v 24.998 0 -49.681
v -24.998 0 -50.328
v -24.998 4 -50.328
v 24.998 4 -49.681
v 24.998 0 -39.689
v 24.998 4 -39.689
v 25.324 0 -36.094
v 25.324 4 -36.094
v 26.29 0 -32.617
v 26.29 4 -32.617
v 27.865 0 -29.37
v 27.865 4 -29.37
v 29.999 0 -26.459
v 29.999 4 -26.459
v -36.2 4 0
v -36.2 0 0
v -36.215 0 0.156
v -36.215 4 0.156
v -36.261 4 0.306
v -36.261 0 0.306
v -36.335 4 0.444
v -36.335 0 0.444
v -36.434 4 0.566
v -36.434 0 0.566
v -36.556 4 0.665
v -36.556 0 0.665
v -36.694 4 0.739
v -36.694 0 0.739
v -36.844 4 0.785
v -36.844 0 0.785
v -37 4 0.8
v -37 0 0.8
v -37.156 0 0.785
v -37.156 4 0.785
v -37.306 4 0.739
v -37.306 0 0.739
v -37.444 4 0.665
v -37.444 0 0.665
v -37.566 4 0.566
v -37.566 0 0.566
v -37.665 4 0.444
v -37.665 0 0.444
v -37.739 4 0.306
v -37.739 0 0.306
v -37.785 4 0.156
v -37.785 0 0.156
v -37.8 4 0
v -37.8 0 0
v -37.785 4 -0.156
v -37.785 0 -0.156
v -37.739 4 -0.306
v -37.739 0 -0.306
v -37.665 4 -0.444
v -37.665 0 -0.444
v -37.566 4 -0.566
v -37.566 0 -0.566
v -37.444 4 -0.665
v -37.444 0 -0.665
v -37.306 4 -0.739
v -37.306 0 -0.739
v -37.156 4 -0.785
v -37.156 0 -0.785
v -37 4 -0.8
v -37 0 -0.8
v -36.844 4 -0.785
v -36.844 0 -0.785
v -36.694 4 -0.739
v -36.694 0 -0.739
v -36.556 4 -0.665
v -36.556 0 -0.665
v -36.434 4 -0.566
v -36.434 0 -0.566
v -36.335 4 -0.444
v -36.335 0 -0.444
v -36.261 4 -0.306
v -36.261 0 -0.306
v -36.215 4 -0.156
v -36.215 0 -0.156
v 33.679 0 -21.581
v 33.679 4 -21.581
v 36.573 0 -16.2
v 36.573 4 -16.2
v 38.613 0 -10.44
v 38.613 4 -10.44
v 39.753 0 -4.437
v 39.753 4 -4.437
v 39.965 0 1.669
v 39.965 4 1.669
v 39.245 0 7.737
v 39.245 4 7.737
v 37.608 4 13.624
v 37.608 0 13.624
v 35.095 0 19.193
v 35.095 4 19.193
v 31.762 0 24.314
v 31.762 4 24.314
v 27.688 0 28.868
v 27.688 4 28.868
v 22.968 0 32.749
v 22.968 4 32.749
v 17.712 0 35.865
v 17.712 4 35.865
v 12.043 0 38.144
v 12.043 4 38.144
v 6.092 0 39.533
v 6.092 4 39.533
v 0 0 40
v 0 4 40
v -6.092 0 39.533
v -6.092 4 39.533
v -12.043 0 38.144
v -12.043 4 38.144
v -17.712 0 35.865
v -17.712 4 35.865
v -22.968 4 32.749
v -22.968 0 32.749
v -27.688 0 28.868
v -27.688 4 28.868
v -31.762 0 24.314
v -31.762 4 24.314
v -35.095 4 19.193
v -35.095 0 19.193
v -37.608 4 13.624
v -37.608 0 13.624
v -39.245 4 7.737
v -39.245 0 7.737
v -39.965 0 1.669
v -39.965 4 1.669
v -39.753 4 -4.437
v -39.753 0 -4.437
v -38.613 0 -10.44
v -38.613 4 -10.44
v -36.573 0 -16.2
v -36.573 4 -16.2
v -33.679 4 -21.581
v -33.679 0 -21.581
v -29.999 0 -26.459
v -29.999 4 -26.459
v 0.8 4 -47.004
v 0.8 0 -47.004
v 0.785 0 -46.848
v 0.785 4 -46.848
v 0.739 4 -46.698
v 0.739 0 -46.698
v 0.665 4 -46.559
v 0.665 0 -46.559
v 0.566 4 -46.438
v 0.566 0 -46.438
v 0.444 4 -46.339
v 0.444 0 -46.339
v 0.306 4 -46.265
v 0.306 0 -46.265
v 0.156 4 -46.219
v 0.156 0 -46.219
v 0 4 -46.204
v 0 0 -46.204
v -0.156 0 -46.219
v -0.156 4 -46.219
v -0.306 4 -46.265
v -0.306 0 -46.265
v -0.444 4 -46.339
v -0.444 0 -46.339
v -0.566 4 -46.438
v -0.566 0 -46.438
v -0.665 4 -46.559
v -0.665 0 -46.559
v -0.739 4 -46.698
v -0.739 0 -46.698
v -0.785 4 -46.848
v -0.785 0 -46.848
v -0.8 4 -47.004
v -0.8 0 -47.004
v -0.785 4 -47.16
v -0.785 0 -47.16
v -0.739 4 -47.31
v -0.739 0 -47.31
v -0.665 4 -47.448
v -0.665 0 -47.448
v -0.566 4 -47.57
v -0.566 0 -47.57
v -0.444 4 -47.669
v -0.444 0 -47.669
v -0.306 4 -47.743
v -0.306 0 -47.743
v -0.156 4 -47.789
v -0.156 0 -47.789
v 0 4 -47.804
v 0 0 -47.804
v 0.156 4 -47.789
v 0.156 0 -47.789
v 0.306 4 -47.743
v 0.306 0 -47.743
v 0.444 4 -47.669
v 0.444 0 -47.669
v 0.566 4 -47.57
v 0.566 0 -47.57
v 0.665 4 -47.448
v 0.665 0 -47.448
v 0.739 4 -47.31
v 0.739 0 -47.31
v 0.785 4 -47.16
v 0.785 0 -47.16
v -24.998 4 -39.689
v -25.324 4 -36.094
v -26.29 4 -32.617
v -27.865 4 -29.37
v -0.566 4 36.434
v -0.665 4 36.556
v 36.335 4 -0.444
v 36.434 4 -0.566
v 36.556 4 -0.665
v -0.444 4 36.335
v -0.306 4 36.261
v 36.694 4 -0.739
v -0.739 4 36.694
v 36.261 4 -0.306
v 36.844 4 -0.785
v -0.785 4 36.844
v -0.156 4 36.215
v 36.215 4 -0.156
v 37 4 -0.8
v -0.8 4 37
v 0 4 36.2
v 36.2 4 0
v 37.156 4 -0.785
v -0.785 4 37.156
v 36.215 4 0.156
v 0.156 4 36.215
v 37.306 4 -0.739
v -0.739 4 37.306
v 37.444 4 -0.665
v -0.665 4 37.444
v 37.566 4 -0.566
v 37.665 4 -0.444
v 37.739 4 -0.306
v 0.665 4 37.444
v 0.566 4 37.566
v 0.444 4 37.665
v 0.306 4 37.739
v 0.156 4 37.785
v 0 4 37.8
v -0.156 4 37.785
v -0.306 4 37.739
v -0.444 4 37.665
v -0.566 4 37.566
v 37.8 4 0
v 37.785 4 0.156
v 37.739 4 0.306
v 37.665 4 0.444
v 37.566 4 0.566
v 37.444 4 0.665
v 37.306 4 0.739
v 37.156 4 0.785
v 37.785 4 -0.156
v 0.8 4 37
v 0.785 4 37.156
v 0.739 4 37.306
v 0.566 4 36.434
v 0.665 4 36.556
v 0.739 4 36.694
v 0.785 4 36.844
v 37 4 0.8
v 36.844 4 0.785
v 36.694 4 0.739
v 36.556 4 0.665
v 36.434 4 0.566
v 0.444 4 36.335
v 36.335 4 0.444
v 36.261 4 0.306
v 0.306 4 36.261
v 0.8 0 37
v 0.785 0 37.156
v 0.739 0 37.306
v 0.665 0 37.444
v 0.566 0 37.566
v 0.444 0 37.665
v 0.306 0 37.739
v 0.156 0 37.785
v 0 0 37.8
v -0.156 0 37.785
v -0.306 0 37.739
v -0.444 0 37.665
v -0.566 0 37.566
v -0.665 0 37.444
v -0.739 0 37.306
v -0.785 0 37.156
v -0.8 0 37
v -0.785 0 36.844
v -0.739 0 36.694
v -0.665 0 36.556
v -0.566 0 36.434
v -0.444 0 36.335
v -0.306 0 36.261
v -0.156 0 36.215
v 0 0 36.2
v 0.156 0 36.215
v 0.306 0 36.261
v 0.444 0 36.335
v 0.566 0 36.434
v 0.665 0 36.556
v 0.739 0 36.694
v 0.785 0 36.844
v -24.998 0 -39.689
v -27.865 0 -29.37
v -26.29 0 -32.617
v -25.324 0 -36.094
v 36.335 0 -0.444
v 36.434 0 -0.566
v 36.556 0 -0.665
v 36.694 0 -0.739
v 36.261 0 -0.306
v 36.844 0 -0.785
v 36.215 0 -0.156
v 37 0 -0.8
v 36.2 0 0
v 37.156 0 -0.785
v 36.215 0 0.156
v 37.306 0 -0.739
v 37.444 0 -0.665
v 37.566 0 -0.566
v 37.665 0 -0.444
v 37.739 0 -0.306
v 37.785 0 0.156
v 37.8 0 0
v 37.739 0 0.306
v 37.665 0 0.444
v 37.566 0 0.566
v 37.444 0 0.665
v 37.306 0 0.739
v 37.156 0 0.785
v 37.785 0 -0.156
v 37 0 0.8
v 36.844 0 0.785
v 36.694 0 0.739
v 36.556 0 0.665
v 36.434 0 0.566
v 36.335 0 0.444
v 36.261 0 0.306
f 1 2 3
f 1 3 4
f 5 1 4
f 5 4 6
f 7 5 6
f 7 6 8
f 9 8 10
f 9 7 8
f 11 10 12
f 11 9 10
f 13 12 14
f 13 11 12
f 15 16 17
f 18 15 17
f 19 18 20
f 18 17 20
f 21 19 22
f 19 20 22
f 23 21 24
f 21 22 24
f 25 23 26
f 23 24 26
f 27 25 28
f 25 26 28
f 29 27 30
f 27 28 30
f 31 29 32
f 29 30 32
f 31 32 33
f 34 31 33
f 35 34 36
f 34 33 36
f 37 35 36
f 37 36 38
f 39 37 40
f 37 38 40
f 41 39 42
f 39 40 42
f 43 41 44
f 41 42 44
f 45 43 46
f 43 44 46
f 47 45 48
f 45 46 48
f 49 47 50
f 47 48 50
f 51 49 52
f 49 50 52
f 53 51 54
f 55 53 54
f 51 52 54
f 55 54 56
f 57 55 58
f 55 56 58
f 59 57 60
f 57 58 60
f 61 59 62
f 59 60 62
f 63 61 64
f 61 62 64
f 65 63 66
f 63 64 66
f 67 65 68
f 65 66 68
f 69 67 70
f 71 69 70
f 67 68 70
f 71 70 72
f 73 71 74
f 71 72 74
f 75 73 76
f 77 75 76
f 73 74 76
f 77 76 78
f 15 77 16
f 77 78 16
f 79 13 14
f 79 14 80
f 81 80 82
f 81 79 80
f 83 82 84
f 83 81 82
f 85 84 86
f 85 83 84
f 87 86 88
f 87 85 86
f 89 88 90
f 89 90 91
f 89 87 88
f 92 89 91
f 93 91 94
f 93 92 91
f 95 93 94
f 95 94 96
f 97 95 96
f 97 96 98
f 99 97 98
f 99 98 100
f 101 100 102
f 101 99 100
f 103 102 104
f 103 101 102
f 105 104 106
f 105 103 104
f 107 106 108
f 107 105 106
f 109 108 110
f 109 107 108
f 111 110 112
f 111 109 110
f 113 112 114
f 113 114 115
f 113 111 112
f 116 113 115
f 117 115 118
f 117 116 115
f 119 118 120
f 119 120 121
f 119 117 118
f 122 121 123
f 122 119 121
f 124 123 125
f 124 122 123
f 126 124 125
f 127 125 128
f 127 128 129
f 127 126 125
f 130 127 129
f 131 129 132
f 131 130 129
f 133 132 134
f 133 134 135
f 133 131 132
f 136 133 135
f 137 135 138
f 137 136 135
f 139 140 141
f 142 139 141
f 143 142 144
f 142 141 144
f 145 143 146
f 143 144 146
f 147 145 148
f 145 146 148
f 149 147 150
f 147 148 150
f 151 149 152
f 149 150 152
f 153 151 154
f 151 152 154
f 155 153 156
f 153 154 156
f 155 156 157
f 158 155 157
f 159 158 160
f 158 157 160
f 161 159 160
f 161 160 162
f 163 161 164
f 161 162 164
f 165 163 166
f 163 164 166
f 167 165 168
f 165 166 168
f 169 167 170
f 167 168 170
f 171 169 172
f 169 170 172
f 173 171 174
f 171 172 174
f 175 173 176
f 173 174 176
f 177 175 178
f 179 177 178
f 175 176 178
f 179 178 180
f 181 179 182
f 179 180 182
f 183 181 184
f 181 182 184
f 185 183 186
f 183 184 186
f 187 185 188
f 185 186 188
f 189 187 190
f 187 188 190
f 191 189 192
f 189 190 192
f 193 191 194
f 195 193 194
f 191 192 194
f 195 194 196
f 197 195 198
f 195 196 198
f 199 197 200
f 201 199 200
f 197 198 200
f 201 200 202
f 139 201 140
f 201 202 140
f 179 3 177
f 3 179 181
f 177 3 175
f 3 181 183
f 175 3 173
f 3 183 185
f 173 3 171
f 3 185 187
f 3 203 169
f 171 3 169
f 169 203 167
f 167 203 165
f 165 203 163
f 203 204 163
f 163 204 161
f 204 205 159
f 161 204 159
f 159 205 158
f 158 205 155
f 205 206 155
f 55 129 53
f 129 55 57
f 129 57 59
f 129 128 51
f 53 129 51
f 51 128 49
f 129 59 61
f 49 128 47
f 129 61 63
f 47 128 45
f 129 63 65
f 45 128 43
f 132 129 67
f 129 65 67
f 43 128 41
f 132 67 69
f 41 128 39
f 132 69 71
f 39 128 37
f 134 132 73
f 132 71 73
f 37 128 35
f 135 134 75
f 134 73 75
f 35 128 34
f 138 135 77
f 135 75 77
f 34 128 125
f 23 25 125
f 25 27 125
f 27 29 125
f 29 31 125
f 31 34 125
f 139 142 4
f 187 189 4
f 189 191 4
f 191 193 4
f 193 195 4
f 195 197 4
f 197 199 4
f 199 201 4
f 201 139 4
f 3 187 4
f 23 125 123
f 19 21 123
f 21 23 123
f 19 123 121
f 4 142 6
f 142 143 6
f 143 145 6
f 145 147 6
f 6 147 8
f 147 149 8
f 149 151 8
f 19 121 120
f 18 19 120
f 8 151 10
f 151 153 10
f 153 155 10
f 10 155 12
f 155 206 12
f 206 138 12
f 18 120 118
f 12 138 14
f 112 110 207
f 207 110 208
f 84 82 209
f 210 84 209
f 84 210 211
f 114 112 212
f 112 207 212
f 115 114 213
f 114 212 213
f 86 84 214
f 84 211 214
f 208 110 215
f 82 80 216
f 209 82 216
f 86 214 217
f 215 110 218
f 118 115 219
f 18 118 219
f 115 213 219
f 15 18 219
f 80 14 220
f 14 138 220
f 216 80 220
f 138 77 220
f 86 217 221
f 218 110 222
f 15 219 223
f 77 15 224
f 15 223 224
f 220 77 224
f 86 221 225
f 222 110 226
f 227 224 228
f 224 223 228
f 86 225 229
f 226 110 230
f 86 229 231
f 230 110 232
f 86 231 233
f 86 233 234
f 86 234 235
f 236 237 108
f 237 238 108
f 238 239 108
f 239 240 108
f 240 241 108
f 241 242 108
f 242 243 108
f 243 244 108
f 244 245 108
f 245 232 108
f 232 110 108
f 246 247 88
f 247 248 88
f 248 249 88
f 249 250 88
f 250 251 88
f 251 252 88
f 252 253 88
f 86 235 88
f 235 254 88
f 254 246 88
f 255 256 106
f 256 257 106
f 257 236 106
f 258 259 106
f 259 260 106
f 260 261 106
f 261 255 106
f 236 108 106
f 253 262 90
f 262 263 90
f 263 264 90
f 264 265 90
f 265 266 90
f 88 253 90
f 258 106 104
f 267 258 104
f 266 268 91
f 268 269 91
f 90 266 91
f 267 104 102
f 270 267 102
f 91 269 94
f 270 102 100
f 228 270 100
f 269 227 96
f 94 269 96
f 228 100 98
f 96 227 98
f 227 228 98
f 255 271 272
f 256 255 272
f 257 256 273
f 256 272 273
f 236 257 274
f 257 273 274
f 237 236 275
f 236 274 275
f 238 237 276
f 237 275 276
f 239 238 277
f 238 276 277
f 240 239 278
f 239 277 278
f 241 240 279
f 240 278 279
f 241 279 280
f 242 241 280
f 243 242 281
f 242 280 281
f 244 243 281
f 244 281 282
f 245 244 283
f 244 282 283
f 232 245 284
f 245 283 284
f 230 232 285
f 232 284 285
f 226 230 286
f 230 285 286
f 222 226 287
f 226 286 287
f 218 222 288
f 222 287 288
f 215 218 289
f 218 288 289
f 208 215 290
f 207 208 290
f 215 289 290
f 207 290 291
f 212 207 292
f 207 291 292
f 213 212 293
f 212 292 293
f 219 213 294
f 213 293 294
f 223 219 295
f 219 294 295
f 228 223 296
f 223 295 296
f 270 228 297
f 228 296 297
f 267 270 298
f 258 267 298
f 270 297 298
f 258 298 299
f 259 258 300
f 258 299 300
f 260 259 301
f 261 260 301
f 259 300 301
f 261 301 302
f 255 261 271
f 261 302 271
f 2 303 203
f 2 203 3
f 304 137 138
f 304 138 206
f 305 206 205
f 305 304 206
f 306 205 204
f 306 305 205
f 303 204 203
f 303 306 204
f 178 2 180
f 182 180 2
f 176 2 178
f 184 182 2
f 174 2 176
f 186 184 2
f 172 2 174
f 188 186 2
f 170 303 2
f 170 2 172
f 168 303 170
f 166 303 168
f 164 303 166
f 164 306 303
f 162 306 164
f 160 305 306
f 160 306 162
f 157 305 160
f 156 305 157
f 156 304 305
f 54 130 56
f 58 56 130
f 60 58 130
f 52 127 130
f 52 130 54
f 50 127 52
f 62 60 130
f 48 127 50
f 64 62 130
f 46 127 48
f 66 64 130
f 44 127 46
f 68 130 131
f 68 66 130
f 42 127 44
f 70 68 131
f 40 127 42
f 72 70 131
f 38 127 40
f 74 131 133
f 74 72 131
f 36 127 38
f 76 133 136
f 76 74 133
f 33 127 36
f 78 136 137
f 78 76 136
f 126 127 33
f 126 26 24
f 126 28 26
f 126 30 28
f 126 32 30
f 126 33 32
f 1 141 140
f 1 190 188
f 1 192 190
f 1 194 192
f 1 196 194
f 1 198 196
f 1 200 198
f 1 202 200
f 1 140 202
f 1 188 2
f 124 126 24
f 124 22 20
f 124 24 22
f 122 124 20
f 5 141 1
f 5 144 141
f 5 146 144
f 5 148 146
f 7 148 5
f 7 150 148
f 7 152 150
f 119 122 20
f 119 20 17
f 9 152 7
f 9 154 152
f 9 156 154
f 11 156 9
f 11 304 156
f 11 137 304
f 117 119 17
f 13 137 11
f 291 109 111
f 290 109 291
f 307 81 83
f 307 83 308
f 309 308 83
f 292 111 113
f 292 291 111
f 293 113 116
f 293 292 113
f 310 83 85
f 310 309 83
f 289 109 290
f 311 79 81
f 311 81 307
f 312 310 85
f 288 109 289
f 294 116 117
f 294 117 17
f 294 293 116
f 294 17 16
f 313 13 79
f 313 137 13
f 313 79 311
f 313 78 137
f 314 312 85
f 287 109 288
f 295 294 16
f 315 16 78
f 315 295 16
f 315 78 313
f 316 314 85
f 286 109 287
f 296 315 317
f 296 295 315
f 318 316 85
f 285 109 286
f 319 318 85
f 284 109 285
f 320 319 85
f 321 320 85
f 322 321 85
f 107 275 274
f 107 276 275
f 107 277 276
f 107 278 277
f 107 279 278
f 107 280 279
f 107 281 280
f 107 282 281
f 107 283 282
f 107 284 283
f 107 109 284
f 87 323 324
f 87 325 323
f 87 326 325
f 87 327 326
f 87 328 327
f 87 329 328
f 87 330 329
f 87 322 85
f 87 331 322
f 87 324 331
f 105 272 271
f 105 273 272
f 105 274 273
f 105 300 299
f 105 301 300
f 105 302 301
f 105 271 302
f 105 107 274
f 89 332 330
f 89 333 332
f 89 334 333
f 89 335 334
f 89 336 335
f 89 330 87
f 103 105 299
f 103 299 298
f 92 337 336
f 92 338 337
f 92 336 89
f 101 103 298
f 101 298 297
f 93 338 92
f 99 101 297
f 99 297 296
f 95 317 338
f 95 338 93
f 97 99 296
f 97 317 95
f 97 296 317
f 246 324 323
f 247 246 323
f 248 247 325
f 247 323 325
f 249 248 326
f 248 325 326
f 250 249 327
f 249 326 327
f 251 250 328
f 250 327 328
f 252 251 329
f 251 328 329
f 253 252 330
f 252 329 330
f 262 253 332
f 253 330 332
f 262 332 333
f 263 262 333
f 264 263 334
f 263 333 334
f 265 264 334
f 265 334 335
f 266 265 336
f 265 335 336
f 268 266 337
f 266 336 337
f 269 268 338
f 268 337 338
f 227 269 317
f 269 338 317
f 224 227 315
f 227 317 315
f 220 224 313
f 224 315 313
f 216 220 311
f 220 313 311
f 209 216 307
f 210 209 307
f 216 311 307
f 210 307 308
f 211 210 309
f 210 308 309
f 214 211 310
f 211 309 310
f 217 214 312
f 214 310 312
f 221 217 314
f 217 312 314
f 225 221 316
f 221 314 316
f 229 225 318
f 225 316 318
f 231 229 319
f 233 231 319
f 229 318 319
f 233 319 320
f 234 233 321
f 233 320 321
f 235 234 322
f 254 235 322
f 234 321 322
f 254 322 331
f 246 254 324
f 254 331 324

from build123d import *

# Parameters (mm, degrees)
SKETCH_1_R      = 0.8
EXTRUDE_1_DEPTH = 4


with BuildPart() as part:
    # 스케치1 → 보스-돌출1 (new body)
    with BuildSketch(Plane.XZ):
        with BuildLine():
            Line((-24.997908733, -39.688640814), (-24.997908733, -50.327538671))
            Line((-24.997908733, -50.327538671), (24.997908733, -49.680827096))
            Line((24.997908733, -49.680827096), (24.997908733, -39.688640814))
            ThreePointArc((24.997908733, -39.688640814), (26.289808105, -32.617080103), (29.998605822, -26.459093876))
            ThreePointArc((29.998605822, -26.459093876), (0, 40), (-29.998605822, -26.459093876))
            ThreePointArc((-29.998605822, -26.459093876), (-26.289808105, -32.617080103), (-24.997908733, -39.688640814))
        make_face()
        with Locations((37, 0)):
            Circle(SKETCH_1_R, mode=Mode.SUBTRACT)
        with Locations((0, 37)):
            Circle(SKETCH_1_R, mode=Mode.SUBTRACT)
        with Locations((-37, 0)):
            Circle(SKETCH_1_R, mode=Mode.SUBTRACT)
        with Locations((0, -47.00393191)):
            Circle(SKETCH_1_R, mode=Mode.SUBTRACT)
    extrude(amount=-EXTRUDE_1_DEPTH)


solid = part.part
